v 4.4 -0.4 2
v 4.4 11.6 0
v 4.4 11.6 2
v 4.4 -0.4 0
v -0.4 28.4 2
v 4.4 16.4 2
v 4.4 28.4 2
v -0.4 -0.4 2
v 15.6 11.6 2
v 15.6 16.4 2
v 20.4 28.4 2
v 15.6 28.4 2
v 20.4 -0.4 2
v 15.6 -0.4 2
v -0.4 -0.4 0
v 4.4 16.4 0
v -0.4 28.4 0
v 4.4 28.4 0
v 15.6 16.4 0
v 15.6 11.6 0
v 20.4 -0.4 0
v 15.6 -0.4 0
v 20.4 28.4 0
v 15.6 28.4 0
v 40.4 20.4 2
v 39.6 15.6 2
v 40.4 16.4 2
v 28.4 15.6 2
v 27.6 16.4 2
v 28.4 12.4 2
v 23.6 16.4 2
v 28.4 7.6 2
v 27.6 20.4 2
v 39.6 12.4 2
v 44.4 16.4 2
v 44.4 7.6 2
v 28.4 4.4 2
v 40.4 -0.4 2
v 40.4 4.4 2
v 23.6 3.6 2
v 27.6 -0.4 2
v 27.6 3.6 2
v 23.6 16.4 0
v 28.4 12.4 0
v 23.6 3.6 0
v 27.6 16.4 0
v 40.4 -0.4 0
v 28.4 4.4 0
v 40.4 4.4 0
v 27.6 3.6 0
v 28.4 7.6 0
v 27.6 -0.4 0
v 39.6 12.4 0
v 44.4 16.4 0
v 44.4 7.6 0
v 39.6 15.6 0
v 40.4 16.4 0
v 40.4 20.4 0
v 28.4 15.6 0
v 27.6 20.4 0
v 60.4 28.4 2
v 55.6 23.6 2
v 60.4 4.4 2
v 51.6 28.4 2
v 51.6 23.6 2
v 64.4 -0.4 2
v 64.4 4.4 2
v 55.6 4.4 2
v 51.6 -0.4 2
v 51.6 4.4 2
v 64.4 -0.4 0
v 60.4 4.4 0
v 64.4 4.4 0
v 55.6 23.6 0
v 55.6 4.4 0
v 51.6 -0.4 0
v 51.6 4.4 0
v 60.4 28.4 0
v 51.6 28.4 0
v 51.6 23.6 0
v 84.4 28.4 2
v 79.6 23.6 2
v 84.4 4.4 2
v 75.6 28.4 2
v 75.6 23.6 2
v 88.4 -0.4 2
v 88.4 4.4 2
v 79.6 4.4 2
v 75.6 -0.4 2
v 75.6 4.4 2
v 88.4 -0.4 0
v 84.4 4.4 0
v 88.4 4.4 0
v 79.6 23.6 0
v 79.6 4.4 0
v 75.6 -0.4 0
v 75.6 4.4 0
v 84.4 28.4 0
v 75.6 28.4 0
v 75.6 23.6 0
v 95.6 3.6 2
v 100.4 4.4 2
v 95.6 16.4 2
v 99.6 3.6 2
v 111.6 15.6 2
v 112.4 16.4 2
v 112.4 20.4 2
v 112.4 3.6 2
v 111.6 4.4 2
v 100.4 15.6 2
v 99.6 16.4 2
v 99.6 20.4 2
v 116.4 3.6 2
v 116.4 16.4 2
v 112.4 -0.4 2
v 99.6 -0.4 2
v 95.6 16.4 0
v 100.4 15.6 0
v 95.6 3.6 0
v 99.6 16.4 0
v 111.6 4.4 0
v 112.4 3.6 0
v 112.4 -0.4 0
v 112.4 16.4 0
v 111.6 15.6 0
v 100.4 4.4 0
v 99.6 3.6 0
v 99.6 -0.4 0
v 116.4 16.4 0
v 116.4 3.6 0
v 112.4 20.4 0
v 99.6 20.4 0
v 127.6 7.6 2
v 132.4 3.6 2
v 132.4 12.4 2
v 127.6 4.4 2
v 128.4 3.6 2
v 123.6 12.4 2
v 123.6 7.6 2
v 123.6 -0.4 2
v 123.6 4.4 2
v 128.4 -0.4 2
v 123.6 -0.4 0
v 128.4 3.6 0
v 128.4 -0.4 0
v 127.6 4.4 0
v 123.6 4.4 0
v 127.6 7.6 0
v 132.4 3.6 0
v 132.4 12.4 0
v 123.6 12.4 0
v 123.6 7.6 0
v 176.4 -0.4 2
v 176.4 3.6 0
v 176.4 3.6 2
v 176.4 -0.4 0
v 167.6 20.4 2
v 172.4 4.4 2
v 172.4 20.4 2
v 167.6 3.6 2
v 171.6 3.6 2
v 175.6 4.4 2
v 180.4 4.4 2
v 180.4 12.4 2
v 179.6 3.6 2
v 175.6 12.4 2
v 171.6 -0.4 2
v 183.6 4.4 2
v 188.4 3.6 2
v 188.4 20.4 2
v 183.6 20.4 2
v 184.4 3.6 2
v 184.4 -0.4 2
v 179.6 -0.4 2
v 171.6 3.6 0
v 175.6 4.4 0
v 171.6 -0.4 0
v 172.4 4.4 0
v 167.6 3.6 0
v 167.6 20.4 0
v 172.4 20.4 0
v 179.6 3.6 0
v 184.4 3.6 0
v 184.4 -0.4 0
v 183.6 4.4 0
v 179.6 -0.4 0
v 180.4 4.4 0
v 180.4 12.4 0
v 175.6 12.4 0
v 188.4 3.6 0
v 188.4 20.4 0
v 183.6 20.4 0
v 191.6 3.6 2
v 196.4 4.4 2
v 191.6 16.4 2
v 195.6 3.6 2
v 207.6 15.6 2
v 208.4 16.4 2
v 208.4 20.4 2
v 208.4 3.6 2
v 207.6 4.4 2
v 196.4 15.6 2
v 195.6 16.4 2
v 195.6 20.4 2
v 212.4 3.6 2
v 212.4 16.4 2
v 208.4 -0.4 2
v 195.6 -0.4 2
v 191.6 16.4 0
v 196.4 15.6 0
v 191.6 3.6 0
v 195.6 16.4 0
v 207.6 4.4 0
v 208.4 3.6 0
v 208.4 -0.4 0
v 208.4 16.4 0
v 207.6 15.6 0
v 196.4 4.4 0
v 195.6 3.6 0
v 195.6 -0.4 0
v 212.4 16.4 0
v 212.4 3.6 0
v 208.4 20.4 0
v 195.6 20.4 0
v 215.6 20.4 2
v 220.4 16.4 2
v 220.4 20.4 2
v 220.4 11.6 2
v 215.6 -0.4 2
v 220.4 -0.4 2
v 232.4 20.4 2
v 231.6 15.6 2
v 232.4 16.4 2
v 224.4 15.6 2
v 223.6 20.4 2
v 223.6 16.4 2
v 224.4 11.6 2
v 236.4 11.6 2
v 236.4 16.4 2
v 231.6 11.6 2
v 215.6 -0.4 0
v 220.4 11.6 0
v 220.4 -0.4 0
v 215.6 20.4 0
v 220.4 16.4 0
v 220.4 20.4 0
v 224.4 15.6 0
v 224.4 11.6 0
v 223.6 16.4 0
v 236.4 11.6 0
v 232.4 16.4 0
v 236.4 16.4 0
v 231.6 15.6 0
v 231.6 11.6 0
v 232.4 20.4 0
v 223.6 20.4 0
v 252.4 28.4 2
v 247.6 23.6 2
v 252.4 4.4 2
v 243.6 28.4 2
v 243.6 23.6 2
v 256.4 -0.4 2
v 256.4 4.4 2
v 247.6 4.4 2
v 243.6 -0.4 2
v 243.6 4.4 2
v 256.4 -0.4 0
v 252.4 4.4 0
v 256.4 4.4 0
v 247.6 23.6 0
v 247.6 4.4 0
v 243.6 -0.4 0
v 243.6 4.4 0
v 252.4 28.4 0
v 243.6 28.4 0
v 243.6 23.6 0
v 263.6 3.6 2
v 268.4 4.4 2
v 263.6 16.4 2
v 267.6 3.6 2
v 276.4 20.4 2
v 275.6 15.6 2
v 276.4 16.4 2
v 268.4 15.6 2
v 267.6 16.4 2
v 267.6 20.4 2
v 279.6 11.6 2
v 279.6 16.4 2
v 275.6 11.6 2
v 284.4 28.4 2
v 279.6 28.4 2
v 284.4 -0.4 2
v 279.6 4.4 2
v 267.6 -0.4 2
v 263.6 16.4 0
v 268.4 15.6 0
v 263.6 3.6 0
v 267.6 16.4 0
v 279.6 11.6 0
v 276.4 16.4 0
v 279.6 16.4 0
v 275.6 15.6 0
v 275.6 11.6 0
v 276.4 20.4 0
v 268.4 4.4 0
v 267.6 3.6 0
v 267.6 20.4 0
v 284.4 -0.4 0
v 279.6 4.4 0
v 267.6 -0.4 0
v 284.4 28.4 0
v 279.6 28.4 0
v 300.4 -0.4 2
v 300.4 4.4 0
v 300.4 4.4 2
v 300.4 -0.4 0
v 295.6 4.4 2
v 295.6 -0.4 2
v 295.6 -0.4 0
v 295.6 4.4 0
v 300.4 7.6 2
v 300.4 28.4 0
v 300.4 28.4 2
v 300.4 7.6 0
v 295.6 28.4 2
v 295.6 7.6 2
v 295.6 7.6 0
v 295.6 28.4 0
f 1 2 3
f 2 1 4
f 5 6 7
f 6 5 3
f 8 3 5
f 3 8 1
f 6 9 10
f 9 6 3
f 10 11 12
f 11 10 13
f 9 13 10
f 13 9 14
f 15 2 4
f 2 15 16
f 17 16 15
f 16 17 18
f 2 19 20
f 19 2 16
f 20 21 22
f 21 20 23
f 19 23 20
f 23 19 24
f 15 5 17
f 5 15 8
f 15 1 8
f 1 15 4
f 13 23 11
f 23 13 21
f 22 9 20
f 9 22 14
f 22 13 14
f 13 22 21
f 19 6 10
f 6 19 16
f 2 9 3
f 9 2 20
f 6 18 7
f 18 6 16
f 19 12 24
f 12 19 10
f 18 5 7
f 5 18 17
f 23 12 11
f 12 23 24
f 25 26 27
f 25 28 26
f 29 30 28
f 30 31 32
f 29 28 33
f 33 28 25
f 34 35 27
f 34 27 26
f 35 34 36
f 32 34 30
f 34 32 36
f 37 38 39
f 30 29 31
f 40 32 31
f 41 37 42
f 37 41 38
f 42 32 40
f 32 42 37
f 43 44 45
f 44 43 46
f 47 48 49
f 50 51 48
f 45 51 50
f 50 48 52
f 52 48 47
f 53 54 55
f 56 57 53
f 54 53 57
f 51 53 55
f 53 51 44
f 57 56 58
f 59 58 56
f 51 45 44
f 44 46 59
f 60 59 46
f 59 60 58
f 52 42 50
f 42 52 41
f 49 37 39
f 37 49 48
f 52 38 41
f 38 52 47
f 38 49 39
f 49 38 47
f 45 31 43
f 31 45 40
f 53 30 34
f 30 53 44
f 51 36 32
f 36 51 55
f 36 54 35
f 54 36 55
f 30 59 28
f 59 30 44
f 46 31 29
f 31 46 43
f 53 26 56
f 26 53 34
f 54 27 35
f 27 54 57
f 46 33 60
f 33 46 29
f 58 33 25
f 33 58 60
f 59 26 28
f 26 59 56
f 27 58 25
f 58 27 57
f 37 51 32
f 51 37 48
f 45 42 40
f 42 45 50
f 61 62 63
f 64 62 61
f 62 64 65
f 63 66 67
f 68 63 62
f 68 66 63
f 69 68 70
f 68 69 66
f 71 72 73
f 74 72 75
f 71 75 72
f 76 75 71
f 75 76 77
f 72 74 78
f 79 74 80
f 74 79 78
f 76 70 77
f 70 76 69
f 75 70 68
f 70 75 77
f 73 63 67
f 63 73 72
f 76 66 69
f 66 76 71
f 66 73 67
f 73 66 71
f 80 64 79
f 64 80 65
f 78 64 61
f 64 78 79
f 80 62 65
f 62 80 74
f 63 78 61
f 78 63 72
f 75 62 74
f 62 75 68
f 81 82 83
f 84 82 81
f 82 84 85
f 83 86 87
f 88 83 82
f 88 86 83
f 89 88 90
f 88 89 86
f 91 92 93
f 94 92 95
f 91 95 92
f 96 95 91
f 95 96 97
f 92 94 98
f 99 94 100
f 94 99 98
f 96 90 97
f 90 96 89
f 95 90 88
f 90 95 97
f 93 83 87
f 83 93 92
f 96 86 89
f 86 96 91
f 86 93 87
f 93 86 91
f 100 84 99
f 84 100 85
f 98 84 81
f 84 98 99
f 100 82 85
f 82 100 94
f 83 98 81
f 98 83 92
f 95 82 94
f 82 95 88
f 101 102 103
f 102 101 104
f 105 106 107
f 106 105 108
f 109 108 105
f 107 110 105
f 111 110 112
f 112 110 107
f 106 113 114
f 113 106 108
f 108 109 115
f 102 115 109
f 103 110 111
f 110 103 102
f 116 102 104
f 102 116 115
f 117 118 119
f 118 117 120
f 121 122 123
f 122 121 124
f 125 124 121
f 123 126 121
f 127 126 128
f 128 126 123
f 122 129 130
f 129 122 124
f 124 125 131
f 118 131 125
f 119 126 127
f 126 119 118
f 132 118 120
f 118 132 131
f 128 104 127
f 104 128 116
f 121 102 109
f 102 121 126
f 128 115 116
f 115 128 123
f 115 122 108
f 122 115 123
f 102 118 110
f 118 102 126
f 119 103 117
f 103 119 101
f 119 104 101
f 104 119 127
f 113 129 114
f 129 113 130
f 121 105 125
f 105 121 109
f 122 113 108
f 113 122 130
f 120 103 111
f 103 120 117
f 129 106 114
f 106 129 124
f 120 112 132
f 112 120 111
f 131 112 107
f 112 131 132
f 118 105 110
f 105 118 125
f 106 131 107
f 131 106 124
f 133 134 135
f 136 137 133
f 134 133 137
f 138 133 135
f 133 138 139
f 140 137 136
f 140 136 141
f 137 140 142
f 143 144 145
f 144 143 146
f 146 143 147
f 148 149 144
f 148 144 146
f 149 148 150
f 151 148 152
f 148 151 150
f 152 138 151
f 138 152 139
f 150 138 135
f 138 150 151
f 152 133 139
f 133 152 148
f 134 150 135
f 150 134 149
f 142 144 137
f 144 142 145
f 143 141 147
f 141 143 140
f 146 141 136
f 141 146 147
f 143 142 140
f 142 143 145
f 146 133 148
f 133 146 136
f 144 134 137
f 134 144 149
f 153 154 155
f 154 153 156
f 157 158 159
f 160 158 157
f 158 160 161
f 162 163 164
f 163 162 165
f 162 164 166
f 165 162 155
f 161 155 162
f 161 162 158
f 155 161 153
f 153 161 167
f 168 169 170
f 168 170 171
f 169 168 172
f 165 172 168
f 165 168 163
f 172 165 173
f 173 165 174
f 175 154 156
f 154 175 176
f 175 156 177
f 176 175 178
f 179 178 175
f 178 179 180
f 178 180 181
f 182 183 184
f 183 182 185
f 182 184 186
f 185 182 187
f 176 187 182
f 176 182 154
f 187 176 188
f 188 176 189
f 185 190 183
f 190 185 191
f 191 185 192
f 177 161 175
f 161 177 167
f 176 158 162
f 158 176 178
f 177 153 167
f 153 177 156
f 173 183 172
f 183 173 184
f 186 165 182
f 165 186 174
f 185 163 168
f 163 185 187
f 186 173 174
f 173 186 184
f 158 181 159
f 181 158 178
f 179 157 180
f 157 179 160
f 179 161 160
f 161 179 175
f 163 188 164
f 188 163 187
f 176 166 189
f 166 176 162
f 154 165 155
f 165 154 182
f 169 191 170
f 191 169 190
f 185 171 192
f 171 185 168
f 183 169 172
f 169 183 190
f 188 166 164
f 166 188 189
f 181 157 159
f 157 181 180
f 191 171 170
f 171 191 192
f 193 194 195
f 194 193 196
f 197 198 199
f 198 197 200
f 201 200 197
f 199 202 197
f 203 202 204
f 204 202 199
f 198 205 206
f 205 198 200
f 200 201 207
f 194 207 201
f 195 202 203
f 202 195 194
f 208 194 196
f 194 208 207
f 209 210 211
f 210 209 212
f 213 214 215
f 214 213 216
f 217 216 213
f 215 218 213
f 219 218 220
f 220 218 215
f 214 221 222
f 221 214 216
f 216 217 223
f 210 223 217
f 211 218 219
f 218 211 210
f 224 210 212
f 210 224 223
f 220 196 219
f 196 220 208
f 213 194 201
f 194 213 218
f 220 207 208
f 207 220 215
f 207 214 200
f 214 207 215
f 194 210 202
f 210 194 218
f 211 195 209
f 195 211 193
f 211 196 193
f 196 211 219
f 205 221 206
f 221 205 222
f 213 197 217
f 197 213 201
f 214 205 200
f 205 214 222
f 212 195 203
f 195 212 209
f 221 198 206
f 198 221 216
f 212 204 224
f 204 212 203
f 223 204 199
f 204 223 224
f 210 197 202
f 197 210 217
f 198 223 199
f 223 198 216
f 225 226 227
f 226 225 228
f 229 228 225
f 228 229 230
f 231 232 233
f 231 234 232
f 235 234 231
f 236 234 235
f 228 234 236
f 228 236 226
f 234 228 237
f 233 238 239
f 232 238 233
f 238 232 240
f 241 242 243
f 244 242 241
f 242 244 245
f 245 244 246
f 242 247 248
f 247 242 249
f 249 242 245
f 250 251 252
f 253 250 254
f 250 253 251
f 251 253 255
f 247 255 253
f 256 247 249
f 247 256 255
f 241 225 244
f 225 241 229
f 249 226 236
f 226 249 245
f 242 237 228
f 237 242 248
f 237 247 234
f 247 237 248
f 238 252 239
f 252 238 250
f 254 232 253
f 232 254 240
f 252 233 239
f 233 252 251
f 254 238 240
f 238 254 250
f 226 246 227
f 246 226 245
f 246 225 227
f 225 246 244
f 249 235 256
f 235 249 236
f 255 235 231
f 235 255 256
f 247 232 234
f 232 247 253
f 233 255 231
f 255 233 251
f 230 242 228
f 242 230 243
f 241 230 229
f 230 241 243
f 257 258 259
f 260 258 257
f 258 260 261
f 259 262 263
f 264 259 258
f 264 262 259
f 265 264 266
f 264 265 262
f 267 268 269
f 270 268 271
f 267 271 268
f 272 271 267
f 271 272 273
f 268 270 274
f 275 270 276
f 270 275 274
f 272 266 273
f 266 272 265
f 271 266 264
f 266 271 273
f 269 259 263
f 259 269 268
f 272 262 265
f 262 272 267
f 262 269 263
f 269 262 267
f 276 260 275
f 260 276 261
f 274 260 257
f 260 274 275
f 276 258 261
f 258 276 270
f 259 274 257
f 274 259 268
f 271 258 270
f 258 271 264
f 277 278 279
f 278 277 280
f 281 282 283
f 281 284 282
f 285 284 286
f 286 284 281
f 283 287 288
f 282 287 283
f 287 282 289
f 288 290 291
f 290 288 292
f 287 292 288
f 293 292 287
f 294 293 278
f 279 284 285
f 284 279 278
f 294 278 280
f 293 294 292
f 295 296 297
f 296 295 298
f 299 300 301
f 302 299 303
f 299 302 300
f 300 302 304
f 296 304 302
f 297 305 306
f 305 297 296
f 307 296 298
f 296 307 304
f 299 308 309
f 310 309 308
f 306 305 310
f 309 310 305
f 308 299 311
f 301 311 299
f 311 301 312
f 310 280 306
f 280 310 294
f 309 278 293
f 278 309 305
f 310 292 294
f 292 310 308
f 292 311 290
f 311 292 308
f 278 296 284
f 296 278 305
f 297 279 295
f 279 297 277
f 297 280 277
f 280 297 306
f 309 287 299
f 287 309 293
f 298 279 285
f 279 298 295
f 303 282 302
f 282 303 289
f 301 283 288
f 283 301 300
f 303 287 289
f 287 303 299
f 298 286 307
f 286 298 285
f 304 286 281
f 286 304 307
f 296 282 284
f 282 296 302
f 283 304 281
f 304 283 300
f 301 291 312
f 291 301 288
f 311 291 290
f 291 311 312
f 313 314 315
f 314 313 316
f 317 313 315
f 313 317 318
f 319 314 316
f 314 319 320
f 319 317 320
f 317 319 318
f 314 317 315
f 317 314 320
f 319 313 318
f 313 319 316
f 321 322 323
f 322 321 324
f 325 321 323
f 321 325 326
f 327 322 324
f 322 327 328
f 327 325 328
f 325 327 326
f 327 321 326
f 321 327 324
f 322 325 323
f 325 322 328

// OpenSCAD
/*
 * A 3d text generator for OpenSCAD by pgreenland, license CC-BY-SA 3.0.
 *
 * A minor modification to by L2K2, and some comment rewriting.
 *
 * http://www.thingiverse.com/thing:59817
 * http://creativecommons.org/licenses/by-sa/3.0/
 *
 */

// An example: draw "Hello, world!".
scale([4,4,2]) drawtext("Hello, world!");

module drawtext(text) {
	// List of characters.
	chars = " !\"#$%&'()*+,-./0123456789:;<=>?@ABCDEFGHIJKLMNOPQRSTUVWXYZ[\\]^_`abcdefghijklmnopqrstuvwxyz{|}";

	/* Character table defining 5-by-7 characters.
	 *
	 * Adapted from:
	 * http://www.geocities.com/dinceraydin/djlcdsim/chartable.js
	 *
	 */
	char_table = [ [ 0, 0, 0, 0, 0, 0, 0],
	               [ 4, 0, 4, 4, 4, 4, 4],
	               [ 0, 0, 0, 0,10,10,10],
	               [10,10,31,10,31,10,10],
	               [ 4,30, 5,14,20,15, 4],
	               [ 3,19, 8, 4, 2,25,24],
	               [13,18,21, 8,20,18,12],
	               [ 0, 0, 0, 0, 8, 4,12],
	               [ 2, 4, 8, 8, 8, 4, 2],
	               [ 8, 4, 2, 2, 2, 4, 8],
	               [ 0, 4,21,14,21, 4, 0],
	               [ 0, 4, 4,31, 4, 4, 0],
	               [ 8, 4,12, 0, 0, 0, 0],
	               [ 0, 0, 0,31, 0, 0, 0],
	               [12,12, 0, 0, 0, 0, 0],
	               [ 0,16, 8, 4, 2, 1, 0],
	               [14,17,25,21,19,17,14],
	               [14, 4, 4, 4, 4,12, 4],
	               [31, 8, 4, 2, 1,17,14],
	               [14,17, 1, 2, 4, 2,31],
	               [ 2, 2,31,18,10, 6, 2],
	               [14,17, 1, 1,30,16,31],
	               [14,17,17,30,16, 8, 6],
	               [ 8, 8, 8, 4, 2, 1,31],
	               [14,17,17,14,17,17,14],
	               [12, 2, 1,15,17,17,14],
	               [ 0,12,12, 0,12,12, 0],
	               [ 8, 4,12, 0,12,12, 0],
	               [ 2, 4, 8,16, 8, 4, 2],
	               [ 0, 0,31, 0,31, 0, 0],
	               [16, 8, 4, 2, 4, 8,16],
	               [ 4, 0, 4, 2, 1,17,14],
	               [14,21,21,13, 1,17,14],
	               [17,17,31,17,17,17,14],
	               [30,17,17,30,17,17,30],
	               [14,17,16,16,16,17,14],
	               [30,17,17,17,17,17,30],
	               [31,16,16,30,16,16,31],
	               [16,16,16,30,16,16,31],
	               [15,17,17,23,16,17,14],
	               [17,17,17,31,17,17,17],
	               [14, 4, 4, 4, 4, 4,14],
	               [12,18, 2, 2, 2, 2, 7],
	               [17,18,20,24,20,18,17],
	               [31,16,16,16,16,16,16],
	               [17,17,17,21,21,27,17],
	               [17,17,19,21,25,17,17],
	               [14,17,17,17,17,17,14],
	               [16,16,16,30,17,17,30],
	               [13,18,21,17,17,17,14],
	               [17,18,20,30,17,17,30],
	               [30, 1, 1,14,16,16,15],
	               [ 4, 4, 4, 4, 4, 4,31],
	               [14,17,17,17,17,17,17],
	               [ 4,10,17,17,17,17,17],
	               [10,21,21,21,17,17,17],
	               [17,17,10, 4,10,17,17],
	               [ 4, 4, 4,10,17,17,17],
	               [31,16, 8, 4, 2, 1,31],
	               [14, 8, 8, 8, 8, 8,14],
	               [ 0, 1, 2, 4, 8,16, 0],
	               [14, 2, 2, 2, 2, 2,14],
	               [ 0, 0, 0, 0,17,10, 4],
	               [31, 0, 0, 0, 0, 0, 0],
	               [ 0, 0, 0, 0, 2, 4, 8],
	               [15,17,15, 1,14, 0, 0],
	               [30,17,17,25,22,16,16],
	               [14,17,16,16,14, 0, 0],
	               [15,17,17,19,13, 1, 1],
	               [14,16,31,17,14, 0, 0],
	               [ 8, 8, 8,28, 8, 9, 6],
	               [14, 1,15,17,15, 0, 0],
	               [17,17,17,25,22,16,16],
	               [14, 4, 4, 4,12, 0, 4],
	               [12,18, 2, 2, 2, 6, 2],
	               [18,20,24,20,18,16,16],
	               [14, 4, 4, 4, 4, 4,12],
	               [17,17,21,21,26, 0, 0],
	               [17,17,17,25,22, 0, 0],
	               [14,17,17,17,14, 0, 0],
	               [16,16,30,17,30, 0, 0],
	               [ 1, 1,15,19,13, 0, 0],
	               [16,16,16,25,22, 0, 0],
	               [30, 1,14,16,15, 0, 0],
	               [ 6, 9, 8, 8,28, 8, 8],
	               [13,19,17,17,17, 0, 0],
	               [ 4,10,17,17,17, 0, 0],
	               [10,21,21,17,17, 0, 0],
	               [17,10, 4,10,17, 0, 0],
	               [14, 1,15,17,17, 0, 0],
	               [31, 8, 4, 2,31, 0, 0],
	               [ 2, 4, 4, 8, 4, 4, 2],
	               [ 4, 4, 4, 4, 4, 4, 4],
	               [ 8, 4, 4, 2, 4, 4, 8] ];

	// Binary decode table.
	dec_table = [ "00000", "00001", "00010", "00011", "00100", "00101",
	              "00110", "00111", "01000", "01001", "01010", "01011",
	              "01100", "01101", "01110", "01111", "10000", "10001",
	              "10010", "10011", "10100", "10101", "10110", "10111",
	              "11000", "11001", "11010", "11011", "11100", "11101",
	              "11110", "11111" ];

	// Process string one character at a time.
	for(itext = [0:len(text)-1]) {
		// Convert character to index.
		assign(ichar = search(text[itext],chars,1)[0]) {
			// Decode character---rows.
			for(irow = [0:6]) {
				assign(val = dec_table[char_table[ichar][irow]]) {
					// Decode character---cols.
					for(icol = [0:4]) {
						assign(bit = search(val[icol],"01",1)[0]) {
							if(bit) {
								// Output a cube, centered.
								translate([icol + (6*itext) - 0.1, irow - 0.1, 0]) cube([1.2,1.2,1]);
							}
						}
					}
				}
			}
		}
	}
}
